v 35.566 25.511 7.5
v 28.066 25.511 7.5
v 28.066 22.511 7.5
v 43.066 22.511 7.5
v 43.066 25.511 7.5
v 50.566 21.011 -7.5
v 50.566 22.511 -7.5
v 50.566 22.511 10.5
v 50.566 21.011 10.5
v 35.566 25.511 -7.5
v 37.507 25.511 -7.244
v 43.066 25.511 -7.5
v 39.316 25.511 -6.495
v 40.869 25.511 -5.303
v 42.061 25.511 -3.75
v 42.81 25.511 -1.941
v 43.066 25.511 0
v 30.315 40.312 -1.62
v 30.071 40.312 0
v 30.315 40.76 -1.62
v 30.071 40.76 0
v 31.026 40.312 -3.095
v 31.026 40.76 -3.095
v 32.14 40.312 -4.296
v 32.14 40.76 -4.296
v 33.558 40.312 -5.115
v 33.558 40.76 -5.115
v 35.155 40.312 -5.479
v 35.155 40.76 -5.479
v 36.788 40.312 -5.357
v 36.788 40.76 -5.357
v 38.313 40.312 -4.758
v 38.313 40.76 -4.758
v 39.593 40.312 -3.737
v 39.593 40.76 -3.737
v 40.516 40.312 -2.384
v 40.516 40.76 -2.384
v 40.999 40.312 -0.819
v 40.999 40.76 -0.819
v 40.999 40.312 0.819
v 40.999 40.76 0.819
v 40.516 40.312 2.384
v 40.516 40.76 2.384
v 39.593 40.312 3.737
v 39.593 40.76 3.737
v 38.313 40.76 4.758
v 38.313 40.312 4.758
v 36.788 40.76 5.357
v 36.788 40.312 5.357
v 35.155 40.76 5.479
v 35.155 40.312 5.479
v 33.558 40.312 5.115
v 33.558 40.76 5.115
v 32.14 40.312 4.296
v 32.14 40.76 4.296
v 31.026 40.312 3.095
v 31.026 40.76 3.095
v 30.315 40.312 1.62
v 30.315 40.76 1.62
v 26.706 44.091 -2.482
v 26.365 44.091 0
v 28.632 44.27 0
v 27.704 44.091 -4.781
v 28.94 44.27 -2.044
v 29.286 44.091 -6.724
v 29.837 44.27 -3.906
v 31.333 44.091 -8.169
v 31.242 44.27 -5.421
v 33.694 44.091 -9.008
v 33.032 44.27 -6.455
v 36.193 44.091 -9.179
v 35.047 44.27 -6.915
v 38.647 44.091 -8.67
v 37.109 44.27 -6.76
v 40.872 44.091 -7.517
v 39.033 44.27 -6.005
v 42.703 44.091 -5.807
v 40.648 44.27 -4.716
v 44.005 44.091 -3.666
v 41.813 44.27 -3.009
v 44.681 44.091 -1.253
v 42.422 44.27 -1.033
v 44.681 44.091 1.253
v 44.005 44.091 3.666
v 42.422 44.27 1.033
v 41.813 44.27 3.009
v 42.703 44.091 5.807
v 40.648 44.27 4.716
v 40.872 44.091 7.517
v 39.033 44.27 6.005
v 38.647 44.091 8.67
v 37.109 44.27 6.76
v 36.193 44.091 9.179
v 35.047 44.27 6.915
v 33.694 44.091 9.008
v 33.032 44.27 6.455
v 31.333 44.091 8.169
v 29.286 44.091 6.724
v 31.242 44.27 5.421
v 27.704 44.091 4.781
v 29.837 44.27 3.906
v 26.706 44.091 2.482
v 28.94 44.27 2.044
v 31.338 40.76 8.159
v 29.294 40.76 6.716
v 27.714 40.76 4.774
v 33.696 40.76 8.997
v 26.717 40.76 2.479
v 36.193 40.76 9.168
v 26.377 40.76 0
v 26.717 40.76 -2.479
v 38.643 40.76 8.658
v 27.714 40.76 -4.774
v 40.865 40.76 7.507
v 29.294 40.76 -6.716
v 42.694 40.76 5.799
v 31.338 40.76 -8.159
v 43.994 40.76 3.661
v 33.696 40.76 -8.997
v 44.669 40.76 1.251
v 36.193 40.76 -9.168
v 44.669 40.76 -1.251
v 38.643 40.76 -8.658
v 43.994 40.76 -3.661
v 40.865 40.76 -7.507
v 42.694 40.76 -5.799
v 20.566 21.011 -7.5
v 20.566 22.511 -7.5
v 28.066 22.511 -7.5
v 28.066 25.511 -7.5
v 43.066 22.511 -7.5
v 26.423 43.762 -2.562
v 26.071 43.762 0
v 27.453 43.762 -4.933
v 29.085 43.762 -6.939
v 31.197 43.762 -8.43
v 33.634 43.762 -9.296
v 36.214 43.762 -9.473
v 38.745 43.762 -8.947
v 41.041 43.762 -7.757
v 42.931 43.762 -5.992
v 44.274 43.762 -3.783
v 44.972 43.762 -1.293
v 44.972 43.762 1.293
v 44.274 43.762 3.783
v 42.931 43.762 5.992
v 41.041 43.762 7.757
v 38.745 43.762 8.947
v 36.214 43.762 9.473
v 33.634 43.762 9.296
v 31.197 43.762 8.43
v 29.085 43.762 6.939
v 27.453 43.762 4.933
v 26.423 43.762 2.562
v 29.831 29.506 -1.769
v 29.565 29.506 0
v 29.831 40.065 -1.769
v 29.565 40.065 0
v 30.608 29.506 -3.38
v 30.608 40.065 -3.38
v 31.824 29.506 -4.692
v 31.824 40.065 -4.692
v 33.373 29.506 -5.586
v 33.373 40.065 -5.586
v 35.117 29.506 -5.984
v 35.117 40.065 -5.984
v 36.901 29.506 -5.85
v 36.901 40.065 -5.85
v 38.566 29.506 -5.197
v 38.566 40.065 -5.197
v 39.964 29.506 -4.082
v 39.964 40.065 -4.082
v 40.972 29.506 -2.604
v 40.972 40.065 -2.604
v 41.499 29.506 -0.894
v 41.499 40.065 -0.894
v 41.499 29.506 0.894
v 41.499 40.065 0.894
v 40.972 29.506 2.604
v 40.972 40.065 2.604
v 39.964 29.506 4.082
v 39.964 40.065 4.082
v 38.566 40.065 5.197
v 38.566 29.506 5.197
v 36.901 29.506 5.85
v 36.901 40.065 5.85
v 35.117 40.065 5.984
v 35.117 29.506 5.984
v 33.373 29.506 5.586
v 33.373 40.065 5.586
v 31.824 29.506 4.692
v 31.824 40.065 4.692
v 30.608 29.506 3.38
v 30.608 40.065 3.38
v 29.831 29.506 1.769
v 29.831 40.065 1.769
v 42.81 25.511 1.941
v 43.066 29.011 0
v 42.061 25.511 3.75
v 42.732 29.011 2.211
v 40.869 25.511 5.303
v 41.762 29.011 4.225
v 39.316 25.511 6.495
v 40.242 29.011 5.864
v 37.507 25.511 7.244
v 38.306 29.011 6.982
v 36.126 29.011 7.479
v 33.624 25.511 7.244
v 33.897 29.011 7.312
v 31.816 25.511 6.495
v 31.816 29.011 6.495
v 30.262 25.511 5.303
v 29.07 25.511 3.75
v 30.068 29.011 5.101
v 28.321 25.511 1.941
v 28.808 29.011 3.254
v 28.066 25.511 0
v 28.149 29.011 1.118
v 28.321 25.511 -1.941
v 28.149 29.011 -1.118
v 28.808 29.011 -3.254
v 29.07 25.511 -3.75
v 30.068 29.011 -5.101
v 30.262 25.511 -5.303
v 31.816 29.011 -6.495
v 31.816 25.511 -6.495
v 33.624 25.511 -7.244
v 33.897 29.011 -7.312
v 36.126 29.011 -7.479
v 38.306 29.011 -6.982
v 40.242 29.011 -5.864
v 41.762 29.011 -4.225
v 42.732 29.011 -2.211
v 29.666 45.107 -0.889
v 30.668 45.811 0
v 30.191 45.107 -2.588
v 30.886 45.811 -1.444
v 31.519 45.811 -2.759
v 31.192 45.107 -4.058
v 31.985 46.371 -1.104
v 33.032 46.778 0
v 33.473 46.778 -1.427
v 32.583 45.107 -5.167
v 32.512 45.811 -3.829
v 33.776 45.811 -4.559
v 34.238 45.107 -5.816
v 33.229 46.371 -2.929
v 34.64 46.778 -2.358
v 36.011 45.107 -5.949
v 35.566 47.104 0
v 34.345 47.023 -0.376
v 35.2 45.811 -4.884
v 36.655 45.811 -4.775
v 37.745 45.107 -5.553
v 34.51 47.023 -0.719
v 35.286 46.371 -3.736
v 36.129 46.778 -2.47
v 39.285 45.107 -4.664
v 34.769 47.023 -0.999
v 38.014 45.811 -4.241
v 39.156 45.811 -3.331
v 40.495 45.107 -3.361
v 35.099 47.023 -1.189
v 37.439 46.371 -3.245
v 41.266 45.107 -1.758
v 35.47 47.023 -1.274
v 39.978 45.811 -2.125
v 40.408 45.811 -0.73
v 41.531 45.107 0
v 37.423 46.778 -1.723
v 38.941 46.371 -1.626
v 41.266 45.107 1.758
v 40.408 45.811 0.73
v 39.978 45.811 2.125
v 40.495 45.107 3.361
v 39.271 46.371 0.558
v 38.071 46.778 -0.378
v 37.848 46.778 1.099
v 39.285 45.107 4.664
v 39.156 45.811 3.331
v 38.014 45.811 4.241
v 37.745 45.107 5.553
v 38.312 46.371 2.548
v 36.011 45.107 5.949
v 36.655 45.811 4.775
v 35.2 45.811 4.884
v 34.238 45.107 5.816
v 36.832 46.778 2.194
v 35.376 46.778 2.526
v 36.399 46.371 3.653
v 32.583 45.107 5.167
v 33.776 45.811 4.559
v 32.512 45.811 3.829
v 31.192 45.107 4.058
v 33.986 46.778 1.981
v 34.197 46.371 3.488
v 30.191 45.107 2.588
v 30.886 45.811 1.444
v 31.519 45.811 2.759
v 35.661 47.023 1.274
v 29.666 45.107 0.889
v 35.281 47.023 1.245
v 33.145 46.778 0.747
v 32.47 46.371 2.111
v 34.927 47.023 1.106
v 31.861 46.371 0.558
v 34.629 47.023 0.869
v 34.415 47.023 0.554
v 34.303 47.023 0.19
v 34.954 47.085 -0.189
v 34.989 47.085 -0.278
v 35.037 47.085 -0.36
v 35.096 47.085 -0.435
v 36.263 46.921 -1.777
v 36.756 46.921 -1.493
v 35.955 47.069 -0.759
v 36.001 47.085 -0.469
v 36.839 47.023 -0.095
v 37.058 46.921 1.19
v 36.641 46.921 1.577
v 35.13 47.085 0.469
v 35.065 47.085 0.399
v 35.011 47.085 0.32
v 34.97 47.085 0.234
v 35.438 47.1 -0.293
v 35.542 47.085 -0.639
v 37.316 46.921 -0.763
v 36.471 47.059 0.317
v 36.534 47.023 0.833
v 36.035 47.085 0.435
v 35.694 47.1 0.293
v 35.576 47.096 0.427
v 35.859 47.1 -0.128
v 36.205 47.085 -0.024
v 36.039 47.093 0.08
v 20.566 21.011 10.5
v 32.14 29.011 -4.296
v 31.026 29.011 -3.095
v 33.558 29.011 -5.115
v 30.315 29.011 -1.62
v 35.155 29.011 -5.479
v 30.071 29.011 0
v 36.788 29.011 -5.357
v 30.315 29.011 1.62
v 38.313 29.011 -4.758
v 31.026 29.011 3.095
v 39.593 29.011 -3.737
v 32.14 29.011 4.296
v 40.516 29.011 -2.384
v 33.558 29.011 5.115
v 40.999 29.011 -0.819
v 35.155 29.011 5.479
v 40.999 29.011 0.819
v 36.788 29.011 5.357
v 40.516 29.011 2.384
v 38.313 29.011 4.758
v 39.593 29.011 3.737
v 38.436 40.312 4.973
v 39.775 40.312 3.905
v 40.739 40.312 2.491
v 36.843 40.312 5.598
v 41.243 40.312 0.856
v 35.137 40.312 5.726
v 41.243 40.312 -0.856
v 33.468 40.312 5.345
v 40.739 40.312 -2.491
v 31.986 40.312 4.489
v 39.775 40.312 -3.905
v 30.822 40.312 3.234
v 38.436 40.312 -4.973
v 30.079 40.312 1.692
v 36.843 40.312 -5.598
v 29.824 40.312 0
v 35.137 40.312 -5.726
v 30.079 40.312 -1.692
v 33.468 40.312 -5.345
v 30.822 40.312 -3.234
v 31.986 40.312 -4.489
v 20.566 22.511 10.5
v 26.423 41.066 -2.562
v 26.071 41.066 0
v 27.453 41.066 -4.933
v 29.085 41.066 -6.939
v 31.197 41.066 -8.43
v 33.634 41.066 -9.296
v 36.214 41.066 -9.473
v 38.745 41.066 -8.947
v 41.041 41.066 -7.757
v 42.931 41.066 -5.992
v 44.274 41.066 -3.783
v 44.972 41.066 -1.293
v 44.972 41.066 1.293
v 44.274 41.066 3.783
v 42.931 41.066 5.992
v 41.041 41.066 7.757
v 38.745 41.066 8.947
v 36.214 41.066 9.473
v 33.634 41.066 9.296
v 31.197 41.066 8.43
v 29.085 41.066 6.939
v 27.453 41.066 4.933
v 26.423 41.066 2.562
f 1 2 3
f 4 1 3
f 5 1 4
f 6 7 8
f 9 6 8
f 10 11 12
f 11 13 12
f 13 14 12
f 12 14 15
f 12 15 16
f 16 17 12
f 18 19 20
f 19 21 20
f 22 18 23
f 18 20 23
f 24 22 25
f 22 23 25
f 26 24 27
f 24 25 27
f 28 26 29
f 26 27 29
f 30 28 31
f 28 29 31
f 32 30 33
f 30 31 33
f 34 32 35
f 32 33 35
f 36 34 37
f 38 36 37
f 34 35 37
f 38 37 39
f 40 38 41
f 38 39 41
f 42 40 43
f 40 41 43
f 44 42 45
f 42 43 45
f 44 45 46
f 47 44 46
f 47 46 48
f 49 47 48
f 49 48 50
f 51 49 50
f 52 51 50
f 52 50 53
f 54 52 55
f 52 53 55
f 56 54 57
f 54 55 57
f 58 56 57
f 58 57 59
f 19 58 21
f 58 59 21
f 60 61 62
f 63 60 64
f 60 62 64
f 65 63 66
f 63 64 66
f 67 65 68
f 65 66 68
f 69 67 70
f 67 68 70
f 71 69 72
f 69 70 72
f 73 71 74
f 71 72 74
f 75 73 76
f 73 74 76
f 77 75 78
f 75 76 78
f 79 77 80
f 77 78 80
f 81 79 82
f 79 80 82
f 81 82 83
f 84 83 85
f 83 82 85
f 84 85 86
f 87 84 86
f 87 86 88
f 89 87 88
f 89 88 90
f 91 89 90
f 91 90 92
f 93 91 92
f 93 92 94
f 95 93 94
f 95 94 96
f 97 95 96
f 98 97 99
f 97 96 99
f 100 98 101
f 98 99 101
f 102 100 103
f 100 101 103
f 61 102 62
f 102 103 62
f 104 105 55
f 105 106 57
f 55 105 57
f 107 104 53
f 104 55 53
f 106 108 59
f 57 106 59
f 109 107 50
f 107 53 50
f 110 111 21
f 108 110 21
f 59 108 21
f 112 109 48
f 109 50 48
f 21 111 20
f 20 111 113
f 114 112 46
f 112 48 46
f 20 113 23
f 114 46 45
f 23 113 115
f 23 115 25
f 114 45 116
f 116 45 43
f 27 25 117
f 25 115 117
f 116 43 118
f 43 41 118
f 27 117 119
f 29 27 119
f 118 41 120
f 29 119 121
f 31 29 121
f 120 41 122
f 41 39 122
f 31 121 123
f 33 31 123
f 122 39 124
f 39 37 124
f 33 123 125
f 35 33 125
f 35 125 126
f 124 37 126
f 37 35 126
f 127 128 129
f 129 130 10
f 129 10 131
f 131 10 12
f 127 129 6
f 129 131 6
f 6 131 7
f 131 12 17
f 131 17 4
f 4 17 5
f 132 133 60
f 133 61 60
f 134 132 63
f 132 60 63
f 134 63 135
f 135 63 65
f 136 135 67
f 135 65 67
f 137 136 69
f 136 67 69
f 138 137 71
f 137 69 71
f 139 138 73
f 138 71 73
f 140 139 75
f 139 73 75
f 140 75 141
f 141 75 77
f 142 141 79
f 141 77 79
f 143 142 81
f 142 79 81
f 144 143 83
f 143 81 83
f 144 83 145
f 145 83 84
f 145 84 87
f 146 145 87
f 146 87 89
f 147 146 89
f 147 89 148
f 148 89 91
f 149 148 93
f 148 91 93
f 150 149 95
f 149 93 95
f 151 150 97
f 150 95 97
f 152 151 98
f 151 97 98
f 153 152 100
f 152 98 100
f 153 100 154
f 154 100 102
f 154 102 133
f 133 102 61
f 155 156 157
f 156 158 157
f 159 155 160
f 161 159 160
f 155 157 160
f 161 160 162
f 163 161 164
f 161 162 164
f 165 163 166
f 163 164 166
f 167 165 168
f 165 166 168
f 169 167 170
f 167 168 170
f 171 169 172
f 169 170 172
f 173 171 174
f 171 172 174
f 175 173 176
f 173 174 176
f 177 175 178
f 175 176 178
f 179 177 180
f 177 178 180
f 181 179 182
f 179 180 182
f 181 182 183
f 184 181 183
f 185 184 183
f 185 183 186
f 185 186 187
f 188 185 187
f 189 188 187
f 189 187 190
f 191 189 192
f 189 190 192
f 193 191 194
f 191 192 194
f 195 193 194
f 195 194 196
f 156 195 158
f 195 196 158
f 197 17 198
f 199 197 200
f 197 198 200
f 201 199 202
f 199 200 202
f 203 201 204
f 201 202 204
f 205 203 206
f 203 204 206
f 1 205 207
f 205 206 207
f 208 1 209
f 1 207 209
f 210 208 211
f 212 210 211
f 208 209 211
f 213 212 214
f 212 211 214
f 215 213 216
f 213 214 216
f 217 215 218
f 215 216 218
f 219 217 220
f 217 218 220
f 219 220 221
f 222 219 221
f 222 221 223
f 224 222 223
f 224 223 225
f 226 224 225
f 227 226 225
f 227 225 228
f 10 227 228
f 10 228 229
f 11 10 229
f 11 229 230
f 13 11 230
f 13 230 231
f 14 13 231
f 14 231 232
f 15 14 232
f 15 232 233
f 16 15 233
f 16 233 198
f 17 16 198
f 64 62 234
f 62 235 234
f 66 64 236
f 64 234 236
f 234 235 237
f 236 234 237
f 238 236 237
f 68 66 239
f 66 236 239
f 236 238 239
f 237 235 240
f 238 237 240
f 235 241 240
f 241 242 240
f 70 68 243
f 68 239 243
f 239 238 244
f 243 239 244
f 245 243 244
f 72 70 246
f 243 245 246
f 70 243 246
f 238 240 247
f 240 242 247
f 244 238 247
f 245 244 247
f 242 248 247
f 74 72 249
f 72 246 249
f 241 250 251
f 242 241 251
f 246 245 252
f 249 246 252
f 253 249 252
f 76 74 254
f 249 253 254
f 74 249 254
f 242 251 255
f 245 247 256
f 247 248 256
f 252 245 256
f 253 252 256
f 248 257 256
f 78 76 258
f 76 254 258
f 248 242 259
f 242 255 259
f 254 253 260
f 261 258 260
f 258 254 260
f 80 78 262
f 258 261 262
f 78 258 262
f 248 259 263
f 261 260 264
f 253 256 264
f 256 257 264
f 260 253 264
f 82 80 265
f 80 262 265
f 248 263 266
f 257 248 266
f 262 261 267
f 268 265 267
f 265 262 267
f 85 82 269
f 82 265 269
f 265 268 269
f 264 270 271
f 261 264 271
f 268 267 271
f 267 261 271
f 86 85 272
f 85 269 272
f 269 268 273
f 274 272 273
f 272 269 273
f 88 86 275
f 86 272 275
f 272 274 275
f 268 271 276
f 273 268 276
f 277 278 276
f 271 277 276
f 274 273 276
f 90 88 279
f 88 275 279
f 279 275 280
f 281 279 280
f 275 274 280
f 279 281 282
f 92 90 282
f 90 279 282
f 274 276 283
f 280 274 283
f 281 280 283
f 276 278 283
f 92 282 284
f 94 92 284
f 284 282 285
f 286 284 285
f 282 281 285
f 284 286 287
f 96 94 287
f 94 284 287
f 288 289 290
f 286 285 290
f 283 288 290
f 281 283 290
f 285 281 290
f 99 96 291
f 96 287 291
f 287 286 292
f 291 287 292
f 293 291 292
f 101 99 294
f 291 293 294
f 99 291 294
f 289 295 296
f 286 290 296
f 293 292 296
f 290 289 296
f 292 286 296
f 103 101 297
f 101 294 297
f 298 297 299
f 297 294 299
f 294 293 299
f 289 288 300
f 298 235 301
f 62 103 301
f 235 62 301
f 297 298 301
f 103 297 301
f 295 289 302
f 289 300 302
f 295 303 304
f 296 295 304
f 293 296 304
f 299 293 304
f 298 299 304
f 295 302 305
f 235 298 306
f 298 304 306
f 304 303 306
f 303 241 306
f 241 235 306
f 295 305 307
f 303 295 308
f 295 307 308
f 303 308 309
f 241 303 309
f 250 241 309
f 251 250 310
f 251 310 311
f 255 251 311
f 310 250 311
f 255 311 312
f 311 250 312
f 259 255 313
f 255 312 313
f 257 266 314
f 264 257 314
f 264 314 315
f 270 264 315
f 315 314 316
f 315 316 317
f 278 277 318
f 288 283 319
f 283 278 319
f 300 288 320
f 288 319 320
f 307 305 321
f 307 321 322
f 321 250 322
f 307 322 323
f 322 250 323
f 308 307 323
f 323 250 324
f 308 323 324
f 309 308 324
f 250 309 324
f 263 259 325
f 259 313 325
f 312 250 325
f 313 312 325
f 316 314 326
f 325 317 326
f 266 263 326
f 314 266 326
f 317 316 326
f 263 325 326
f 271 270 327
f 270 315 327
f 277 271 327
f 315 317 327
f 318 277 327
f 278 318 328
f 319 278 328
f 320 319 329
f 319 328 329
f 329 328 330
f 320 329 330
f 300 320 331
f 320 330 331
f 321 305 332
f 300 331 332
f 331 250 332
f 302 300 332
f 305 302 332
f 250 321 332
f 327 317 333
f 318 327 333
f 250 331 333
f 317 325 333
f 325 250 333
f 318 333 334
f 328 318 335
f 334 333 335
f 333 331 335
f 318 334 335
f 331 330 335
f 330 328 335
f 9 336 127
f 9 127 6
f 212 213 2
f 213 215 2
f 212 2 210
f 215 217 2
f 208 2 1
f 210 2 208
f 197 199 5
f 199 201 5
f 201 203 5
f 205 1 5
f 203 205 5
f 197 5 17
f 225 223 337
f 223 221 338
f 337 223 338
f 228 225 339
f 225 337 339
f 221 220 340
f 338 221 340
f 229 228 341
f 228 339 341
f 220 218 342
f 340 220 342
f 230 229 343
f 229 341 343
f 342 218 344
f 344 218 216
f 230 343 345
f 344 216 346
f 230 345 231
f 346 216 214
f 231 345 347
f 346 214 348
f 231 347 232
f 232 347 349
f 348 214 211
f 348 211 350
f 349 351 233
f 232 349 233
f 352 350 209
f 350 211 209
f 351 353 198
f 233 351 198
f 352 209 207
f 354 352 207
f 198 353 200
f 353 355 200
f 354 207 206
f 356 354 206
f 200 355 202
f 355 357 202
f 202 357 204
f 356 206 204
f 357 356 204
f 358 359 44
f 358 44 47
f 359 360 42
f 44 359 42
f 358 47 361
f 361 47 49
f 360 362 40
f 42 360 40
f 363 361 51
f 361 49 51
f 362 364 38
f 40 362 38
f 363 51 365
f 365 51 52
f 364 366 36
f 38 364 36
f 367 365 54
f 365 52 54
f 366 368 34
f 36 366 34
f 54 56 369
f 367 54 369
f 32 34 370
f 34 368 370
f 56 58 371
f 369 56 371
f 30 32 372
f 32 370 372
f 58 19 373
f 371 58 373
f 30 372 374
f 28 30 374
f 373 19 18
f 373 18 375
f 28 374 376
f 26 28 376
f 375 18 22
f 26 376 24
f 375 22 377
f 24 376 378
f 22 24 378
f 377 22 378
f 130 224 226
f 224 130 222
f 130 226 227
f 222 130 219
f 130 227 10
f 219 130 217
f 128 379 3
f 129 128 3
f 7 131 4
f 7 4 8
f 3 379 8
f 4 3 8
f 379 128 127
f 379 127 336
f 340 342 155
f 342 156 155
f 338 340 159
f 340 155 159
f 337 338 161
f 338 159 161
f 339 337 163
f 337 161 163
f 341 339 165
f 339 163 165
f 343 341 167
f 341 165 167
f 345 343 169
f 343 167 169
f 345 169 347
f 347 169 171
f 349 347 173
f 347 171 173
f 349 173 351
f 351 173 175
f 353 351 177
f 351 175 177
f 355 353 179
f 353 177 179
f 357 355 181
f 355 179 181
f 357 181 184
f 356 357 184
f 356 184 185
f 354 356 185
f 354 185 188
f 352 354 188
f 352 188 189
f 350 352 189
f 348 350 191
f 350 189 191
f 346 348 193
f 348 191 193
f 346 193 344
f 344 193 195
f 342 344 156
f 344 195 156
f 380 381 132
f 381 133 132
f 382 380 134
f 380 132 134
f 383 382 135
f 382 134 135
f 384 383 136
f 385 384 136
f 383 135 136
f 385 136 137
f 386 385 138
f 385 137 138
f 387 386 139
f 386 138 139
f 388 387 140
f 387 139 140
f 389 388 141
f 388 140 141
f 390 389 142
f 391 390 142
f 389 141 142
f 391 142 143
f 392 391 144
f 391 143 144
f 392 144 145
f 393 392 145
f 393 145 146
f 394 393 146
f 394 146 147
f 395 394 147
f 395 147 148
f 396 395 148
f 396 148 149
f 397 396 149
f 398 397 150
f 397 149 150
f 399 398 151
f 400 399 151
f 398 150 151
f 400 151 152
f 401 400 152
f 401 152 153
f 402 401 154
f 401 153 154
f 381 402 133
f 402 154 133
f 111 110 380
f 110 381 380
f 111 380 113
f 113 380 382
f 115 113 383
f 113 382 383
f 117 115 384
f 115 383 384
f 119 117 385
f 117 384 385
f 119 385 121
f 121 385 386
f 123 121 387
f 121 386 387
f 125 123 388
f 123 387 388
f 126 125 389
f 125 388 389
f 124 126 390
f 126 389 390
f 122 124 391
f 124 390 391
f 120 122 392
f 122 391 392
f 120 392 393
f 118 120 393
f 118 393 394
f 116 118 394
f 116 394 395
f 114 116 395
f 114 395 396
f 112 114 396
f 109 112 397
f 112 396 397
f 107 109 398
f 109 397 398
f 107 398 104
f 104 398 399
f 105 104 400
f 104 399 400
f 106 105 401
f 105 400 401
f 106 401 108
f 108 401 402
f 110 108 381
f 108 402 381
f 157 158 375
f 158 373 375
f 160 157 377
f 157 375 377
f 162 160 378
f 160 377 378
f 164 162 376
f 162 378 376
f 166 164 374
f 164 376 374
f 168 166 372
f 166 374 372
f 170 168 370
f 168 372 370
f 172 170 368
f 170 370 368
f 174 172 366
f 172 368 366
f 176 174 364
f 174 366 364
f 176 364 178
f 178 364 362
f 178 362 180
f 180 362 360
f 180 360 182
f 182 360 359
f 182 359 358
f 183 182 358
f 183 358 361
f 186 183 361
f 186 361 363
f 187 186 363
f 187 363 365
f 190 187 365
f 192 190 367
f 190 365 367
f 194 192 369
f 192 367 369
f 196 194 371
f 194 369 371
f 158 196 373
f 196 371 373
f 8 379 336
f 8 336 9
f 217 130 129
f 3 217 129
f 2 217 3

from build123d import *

# Parameters (mm, degrees)
SCALE1_SCALE        = 0.268090154
SKETCH2_R           = 7.5
BOSS_EXTRUDE1_DEPTH = 3.5
SKETCH3_W           = 15
SKETCH3_H           = 15
BOSS_EXTRUDE2_DEPTH = 3
SKETCH4_W           = 30
SKETCH4_H           = 18
BOSS_EXTRUDE3_DEPTH = 1.5


with BuildPart() as part:
    # Model → Revolve1 (revolve)
    with BuildSketch(Plane.XY):
        with BuildLine():
            Line((35.565588, 69.903749404), (35.565588, 2.41570256))
            Line((35.565588, 2.41570256), (15.0702518, 2.41570256))
            Line((15.0702518, 2.41570256), (13.1823206, 4.2595038))
            Line((13.1823206, 4.2595038), (13.1823206, 43.648122))
            Line((13.1823206, 43.648122), (14.1483334, 44.569888))
            Line((14.1483334, 44.569888), (15.0702518, 44.569888))
            Line((15.0702518, 44.569888), (15.0702518, 46.238668))
            Line((15.0702518, 46.238668), (2.9572712, 46.238668))
            Line((2.9572712, 46.238668), (1.28984502, 46.238668))
            Line((1.28984502, 46.238668), (0.148828252, 47.38116))
            Line((0.148828252, 47.38116), (0.148828252, 57.436766))
            Line((0.148828252, 57.436766), (1.24574554, 58.665872))
            Line((1.24574554, 58.665872), (9.701542865, 59.330571423))
            ThreePointArc((9.701542865, 59.330571423), (21.589655561, 67.170766536), (35.565588, 69.903749404))
        make_face()
    revolve(axis=Axis((35.565588, 69.903749404, 0), (0, -1, 0)))


with BuildPart() as part_1:
    # Scale1: scaled about (35.565588, 38.752959179, 0)
    add(part.part.scale(SCALE1_SCALE).moved(Location((26.030804028, 28.363672377, 0))))

    # Sketch2 → Boss-Extrude1 (add)
    with BuildSketch(Plane.XZ.offset(-29.011298449)):
        with Locations((35.565588, 0)):
            Circle(SKETCH2_R)
    extrude(amount=BOSS_EXTRUDE1_DEPTH)

    # Sketch3 → Boss-Extrude2 (add)
    with BuildSketch(Plane.XZ.offset(-25.511298449)):
        with Locations((35.565588, 0)):
            Rectangle(SKETCH3_W, SKETCH3_H)
    extrude(amount=BOSS_EXTRUDE2_DEPTH)

    # Sketch4 → Boss-Extrude3 (add)
    with BuildSketch(Plane.XZ.offset(-22.511298449)):
        with Locations((35.565588, 1.5)):
            Rectangle(SKETCH4_W, SKETCH4_H)
    extrude(amount=BOSS_EXTRUDE3_DEPTH)


solid = part_1.part
